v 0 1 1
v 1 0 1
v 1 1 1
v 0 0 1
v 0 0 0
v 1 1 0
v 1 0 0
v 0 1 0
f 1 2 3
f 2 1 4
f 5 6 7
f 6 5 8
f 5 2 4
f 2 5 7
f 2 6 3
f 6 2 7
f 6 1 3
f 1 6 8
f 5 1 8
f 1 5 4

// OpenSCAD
// This is for tests of reading files with non-ASCII names, and
// exporting them in various 3D ways to files with non-ASCII names.
// The actual results are of no interest; what is interesting is
// whether the files are successfully read and written.
echo("Hello");
cube();
